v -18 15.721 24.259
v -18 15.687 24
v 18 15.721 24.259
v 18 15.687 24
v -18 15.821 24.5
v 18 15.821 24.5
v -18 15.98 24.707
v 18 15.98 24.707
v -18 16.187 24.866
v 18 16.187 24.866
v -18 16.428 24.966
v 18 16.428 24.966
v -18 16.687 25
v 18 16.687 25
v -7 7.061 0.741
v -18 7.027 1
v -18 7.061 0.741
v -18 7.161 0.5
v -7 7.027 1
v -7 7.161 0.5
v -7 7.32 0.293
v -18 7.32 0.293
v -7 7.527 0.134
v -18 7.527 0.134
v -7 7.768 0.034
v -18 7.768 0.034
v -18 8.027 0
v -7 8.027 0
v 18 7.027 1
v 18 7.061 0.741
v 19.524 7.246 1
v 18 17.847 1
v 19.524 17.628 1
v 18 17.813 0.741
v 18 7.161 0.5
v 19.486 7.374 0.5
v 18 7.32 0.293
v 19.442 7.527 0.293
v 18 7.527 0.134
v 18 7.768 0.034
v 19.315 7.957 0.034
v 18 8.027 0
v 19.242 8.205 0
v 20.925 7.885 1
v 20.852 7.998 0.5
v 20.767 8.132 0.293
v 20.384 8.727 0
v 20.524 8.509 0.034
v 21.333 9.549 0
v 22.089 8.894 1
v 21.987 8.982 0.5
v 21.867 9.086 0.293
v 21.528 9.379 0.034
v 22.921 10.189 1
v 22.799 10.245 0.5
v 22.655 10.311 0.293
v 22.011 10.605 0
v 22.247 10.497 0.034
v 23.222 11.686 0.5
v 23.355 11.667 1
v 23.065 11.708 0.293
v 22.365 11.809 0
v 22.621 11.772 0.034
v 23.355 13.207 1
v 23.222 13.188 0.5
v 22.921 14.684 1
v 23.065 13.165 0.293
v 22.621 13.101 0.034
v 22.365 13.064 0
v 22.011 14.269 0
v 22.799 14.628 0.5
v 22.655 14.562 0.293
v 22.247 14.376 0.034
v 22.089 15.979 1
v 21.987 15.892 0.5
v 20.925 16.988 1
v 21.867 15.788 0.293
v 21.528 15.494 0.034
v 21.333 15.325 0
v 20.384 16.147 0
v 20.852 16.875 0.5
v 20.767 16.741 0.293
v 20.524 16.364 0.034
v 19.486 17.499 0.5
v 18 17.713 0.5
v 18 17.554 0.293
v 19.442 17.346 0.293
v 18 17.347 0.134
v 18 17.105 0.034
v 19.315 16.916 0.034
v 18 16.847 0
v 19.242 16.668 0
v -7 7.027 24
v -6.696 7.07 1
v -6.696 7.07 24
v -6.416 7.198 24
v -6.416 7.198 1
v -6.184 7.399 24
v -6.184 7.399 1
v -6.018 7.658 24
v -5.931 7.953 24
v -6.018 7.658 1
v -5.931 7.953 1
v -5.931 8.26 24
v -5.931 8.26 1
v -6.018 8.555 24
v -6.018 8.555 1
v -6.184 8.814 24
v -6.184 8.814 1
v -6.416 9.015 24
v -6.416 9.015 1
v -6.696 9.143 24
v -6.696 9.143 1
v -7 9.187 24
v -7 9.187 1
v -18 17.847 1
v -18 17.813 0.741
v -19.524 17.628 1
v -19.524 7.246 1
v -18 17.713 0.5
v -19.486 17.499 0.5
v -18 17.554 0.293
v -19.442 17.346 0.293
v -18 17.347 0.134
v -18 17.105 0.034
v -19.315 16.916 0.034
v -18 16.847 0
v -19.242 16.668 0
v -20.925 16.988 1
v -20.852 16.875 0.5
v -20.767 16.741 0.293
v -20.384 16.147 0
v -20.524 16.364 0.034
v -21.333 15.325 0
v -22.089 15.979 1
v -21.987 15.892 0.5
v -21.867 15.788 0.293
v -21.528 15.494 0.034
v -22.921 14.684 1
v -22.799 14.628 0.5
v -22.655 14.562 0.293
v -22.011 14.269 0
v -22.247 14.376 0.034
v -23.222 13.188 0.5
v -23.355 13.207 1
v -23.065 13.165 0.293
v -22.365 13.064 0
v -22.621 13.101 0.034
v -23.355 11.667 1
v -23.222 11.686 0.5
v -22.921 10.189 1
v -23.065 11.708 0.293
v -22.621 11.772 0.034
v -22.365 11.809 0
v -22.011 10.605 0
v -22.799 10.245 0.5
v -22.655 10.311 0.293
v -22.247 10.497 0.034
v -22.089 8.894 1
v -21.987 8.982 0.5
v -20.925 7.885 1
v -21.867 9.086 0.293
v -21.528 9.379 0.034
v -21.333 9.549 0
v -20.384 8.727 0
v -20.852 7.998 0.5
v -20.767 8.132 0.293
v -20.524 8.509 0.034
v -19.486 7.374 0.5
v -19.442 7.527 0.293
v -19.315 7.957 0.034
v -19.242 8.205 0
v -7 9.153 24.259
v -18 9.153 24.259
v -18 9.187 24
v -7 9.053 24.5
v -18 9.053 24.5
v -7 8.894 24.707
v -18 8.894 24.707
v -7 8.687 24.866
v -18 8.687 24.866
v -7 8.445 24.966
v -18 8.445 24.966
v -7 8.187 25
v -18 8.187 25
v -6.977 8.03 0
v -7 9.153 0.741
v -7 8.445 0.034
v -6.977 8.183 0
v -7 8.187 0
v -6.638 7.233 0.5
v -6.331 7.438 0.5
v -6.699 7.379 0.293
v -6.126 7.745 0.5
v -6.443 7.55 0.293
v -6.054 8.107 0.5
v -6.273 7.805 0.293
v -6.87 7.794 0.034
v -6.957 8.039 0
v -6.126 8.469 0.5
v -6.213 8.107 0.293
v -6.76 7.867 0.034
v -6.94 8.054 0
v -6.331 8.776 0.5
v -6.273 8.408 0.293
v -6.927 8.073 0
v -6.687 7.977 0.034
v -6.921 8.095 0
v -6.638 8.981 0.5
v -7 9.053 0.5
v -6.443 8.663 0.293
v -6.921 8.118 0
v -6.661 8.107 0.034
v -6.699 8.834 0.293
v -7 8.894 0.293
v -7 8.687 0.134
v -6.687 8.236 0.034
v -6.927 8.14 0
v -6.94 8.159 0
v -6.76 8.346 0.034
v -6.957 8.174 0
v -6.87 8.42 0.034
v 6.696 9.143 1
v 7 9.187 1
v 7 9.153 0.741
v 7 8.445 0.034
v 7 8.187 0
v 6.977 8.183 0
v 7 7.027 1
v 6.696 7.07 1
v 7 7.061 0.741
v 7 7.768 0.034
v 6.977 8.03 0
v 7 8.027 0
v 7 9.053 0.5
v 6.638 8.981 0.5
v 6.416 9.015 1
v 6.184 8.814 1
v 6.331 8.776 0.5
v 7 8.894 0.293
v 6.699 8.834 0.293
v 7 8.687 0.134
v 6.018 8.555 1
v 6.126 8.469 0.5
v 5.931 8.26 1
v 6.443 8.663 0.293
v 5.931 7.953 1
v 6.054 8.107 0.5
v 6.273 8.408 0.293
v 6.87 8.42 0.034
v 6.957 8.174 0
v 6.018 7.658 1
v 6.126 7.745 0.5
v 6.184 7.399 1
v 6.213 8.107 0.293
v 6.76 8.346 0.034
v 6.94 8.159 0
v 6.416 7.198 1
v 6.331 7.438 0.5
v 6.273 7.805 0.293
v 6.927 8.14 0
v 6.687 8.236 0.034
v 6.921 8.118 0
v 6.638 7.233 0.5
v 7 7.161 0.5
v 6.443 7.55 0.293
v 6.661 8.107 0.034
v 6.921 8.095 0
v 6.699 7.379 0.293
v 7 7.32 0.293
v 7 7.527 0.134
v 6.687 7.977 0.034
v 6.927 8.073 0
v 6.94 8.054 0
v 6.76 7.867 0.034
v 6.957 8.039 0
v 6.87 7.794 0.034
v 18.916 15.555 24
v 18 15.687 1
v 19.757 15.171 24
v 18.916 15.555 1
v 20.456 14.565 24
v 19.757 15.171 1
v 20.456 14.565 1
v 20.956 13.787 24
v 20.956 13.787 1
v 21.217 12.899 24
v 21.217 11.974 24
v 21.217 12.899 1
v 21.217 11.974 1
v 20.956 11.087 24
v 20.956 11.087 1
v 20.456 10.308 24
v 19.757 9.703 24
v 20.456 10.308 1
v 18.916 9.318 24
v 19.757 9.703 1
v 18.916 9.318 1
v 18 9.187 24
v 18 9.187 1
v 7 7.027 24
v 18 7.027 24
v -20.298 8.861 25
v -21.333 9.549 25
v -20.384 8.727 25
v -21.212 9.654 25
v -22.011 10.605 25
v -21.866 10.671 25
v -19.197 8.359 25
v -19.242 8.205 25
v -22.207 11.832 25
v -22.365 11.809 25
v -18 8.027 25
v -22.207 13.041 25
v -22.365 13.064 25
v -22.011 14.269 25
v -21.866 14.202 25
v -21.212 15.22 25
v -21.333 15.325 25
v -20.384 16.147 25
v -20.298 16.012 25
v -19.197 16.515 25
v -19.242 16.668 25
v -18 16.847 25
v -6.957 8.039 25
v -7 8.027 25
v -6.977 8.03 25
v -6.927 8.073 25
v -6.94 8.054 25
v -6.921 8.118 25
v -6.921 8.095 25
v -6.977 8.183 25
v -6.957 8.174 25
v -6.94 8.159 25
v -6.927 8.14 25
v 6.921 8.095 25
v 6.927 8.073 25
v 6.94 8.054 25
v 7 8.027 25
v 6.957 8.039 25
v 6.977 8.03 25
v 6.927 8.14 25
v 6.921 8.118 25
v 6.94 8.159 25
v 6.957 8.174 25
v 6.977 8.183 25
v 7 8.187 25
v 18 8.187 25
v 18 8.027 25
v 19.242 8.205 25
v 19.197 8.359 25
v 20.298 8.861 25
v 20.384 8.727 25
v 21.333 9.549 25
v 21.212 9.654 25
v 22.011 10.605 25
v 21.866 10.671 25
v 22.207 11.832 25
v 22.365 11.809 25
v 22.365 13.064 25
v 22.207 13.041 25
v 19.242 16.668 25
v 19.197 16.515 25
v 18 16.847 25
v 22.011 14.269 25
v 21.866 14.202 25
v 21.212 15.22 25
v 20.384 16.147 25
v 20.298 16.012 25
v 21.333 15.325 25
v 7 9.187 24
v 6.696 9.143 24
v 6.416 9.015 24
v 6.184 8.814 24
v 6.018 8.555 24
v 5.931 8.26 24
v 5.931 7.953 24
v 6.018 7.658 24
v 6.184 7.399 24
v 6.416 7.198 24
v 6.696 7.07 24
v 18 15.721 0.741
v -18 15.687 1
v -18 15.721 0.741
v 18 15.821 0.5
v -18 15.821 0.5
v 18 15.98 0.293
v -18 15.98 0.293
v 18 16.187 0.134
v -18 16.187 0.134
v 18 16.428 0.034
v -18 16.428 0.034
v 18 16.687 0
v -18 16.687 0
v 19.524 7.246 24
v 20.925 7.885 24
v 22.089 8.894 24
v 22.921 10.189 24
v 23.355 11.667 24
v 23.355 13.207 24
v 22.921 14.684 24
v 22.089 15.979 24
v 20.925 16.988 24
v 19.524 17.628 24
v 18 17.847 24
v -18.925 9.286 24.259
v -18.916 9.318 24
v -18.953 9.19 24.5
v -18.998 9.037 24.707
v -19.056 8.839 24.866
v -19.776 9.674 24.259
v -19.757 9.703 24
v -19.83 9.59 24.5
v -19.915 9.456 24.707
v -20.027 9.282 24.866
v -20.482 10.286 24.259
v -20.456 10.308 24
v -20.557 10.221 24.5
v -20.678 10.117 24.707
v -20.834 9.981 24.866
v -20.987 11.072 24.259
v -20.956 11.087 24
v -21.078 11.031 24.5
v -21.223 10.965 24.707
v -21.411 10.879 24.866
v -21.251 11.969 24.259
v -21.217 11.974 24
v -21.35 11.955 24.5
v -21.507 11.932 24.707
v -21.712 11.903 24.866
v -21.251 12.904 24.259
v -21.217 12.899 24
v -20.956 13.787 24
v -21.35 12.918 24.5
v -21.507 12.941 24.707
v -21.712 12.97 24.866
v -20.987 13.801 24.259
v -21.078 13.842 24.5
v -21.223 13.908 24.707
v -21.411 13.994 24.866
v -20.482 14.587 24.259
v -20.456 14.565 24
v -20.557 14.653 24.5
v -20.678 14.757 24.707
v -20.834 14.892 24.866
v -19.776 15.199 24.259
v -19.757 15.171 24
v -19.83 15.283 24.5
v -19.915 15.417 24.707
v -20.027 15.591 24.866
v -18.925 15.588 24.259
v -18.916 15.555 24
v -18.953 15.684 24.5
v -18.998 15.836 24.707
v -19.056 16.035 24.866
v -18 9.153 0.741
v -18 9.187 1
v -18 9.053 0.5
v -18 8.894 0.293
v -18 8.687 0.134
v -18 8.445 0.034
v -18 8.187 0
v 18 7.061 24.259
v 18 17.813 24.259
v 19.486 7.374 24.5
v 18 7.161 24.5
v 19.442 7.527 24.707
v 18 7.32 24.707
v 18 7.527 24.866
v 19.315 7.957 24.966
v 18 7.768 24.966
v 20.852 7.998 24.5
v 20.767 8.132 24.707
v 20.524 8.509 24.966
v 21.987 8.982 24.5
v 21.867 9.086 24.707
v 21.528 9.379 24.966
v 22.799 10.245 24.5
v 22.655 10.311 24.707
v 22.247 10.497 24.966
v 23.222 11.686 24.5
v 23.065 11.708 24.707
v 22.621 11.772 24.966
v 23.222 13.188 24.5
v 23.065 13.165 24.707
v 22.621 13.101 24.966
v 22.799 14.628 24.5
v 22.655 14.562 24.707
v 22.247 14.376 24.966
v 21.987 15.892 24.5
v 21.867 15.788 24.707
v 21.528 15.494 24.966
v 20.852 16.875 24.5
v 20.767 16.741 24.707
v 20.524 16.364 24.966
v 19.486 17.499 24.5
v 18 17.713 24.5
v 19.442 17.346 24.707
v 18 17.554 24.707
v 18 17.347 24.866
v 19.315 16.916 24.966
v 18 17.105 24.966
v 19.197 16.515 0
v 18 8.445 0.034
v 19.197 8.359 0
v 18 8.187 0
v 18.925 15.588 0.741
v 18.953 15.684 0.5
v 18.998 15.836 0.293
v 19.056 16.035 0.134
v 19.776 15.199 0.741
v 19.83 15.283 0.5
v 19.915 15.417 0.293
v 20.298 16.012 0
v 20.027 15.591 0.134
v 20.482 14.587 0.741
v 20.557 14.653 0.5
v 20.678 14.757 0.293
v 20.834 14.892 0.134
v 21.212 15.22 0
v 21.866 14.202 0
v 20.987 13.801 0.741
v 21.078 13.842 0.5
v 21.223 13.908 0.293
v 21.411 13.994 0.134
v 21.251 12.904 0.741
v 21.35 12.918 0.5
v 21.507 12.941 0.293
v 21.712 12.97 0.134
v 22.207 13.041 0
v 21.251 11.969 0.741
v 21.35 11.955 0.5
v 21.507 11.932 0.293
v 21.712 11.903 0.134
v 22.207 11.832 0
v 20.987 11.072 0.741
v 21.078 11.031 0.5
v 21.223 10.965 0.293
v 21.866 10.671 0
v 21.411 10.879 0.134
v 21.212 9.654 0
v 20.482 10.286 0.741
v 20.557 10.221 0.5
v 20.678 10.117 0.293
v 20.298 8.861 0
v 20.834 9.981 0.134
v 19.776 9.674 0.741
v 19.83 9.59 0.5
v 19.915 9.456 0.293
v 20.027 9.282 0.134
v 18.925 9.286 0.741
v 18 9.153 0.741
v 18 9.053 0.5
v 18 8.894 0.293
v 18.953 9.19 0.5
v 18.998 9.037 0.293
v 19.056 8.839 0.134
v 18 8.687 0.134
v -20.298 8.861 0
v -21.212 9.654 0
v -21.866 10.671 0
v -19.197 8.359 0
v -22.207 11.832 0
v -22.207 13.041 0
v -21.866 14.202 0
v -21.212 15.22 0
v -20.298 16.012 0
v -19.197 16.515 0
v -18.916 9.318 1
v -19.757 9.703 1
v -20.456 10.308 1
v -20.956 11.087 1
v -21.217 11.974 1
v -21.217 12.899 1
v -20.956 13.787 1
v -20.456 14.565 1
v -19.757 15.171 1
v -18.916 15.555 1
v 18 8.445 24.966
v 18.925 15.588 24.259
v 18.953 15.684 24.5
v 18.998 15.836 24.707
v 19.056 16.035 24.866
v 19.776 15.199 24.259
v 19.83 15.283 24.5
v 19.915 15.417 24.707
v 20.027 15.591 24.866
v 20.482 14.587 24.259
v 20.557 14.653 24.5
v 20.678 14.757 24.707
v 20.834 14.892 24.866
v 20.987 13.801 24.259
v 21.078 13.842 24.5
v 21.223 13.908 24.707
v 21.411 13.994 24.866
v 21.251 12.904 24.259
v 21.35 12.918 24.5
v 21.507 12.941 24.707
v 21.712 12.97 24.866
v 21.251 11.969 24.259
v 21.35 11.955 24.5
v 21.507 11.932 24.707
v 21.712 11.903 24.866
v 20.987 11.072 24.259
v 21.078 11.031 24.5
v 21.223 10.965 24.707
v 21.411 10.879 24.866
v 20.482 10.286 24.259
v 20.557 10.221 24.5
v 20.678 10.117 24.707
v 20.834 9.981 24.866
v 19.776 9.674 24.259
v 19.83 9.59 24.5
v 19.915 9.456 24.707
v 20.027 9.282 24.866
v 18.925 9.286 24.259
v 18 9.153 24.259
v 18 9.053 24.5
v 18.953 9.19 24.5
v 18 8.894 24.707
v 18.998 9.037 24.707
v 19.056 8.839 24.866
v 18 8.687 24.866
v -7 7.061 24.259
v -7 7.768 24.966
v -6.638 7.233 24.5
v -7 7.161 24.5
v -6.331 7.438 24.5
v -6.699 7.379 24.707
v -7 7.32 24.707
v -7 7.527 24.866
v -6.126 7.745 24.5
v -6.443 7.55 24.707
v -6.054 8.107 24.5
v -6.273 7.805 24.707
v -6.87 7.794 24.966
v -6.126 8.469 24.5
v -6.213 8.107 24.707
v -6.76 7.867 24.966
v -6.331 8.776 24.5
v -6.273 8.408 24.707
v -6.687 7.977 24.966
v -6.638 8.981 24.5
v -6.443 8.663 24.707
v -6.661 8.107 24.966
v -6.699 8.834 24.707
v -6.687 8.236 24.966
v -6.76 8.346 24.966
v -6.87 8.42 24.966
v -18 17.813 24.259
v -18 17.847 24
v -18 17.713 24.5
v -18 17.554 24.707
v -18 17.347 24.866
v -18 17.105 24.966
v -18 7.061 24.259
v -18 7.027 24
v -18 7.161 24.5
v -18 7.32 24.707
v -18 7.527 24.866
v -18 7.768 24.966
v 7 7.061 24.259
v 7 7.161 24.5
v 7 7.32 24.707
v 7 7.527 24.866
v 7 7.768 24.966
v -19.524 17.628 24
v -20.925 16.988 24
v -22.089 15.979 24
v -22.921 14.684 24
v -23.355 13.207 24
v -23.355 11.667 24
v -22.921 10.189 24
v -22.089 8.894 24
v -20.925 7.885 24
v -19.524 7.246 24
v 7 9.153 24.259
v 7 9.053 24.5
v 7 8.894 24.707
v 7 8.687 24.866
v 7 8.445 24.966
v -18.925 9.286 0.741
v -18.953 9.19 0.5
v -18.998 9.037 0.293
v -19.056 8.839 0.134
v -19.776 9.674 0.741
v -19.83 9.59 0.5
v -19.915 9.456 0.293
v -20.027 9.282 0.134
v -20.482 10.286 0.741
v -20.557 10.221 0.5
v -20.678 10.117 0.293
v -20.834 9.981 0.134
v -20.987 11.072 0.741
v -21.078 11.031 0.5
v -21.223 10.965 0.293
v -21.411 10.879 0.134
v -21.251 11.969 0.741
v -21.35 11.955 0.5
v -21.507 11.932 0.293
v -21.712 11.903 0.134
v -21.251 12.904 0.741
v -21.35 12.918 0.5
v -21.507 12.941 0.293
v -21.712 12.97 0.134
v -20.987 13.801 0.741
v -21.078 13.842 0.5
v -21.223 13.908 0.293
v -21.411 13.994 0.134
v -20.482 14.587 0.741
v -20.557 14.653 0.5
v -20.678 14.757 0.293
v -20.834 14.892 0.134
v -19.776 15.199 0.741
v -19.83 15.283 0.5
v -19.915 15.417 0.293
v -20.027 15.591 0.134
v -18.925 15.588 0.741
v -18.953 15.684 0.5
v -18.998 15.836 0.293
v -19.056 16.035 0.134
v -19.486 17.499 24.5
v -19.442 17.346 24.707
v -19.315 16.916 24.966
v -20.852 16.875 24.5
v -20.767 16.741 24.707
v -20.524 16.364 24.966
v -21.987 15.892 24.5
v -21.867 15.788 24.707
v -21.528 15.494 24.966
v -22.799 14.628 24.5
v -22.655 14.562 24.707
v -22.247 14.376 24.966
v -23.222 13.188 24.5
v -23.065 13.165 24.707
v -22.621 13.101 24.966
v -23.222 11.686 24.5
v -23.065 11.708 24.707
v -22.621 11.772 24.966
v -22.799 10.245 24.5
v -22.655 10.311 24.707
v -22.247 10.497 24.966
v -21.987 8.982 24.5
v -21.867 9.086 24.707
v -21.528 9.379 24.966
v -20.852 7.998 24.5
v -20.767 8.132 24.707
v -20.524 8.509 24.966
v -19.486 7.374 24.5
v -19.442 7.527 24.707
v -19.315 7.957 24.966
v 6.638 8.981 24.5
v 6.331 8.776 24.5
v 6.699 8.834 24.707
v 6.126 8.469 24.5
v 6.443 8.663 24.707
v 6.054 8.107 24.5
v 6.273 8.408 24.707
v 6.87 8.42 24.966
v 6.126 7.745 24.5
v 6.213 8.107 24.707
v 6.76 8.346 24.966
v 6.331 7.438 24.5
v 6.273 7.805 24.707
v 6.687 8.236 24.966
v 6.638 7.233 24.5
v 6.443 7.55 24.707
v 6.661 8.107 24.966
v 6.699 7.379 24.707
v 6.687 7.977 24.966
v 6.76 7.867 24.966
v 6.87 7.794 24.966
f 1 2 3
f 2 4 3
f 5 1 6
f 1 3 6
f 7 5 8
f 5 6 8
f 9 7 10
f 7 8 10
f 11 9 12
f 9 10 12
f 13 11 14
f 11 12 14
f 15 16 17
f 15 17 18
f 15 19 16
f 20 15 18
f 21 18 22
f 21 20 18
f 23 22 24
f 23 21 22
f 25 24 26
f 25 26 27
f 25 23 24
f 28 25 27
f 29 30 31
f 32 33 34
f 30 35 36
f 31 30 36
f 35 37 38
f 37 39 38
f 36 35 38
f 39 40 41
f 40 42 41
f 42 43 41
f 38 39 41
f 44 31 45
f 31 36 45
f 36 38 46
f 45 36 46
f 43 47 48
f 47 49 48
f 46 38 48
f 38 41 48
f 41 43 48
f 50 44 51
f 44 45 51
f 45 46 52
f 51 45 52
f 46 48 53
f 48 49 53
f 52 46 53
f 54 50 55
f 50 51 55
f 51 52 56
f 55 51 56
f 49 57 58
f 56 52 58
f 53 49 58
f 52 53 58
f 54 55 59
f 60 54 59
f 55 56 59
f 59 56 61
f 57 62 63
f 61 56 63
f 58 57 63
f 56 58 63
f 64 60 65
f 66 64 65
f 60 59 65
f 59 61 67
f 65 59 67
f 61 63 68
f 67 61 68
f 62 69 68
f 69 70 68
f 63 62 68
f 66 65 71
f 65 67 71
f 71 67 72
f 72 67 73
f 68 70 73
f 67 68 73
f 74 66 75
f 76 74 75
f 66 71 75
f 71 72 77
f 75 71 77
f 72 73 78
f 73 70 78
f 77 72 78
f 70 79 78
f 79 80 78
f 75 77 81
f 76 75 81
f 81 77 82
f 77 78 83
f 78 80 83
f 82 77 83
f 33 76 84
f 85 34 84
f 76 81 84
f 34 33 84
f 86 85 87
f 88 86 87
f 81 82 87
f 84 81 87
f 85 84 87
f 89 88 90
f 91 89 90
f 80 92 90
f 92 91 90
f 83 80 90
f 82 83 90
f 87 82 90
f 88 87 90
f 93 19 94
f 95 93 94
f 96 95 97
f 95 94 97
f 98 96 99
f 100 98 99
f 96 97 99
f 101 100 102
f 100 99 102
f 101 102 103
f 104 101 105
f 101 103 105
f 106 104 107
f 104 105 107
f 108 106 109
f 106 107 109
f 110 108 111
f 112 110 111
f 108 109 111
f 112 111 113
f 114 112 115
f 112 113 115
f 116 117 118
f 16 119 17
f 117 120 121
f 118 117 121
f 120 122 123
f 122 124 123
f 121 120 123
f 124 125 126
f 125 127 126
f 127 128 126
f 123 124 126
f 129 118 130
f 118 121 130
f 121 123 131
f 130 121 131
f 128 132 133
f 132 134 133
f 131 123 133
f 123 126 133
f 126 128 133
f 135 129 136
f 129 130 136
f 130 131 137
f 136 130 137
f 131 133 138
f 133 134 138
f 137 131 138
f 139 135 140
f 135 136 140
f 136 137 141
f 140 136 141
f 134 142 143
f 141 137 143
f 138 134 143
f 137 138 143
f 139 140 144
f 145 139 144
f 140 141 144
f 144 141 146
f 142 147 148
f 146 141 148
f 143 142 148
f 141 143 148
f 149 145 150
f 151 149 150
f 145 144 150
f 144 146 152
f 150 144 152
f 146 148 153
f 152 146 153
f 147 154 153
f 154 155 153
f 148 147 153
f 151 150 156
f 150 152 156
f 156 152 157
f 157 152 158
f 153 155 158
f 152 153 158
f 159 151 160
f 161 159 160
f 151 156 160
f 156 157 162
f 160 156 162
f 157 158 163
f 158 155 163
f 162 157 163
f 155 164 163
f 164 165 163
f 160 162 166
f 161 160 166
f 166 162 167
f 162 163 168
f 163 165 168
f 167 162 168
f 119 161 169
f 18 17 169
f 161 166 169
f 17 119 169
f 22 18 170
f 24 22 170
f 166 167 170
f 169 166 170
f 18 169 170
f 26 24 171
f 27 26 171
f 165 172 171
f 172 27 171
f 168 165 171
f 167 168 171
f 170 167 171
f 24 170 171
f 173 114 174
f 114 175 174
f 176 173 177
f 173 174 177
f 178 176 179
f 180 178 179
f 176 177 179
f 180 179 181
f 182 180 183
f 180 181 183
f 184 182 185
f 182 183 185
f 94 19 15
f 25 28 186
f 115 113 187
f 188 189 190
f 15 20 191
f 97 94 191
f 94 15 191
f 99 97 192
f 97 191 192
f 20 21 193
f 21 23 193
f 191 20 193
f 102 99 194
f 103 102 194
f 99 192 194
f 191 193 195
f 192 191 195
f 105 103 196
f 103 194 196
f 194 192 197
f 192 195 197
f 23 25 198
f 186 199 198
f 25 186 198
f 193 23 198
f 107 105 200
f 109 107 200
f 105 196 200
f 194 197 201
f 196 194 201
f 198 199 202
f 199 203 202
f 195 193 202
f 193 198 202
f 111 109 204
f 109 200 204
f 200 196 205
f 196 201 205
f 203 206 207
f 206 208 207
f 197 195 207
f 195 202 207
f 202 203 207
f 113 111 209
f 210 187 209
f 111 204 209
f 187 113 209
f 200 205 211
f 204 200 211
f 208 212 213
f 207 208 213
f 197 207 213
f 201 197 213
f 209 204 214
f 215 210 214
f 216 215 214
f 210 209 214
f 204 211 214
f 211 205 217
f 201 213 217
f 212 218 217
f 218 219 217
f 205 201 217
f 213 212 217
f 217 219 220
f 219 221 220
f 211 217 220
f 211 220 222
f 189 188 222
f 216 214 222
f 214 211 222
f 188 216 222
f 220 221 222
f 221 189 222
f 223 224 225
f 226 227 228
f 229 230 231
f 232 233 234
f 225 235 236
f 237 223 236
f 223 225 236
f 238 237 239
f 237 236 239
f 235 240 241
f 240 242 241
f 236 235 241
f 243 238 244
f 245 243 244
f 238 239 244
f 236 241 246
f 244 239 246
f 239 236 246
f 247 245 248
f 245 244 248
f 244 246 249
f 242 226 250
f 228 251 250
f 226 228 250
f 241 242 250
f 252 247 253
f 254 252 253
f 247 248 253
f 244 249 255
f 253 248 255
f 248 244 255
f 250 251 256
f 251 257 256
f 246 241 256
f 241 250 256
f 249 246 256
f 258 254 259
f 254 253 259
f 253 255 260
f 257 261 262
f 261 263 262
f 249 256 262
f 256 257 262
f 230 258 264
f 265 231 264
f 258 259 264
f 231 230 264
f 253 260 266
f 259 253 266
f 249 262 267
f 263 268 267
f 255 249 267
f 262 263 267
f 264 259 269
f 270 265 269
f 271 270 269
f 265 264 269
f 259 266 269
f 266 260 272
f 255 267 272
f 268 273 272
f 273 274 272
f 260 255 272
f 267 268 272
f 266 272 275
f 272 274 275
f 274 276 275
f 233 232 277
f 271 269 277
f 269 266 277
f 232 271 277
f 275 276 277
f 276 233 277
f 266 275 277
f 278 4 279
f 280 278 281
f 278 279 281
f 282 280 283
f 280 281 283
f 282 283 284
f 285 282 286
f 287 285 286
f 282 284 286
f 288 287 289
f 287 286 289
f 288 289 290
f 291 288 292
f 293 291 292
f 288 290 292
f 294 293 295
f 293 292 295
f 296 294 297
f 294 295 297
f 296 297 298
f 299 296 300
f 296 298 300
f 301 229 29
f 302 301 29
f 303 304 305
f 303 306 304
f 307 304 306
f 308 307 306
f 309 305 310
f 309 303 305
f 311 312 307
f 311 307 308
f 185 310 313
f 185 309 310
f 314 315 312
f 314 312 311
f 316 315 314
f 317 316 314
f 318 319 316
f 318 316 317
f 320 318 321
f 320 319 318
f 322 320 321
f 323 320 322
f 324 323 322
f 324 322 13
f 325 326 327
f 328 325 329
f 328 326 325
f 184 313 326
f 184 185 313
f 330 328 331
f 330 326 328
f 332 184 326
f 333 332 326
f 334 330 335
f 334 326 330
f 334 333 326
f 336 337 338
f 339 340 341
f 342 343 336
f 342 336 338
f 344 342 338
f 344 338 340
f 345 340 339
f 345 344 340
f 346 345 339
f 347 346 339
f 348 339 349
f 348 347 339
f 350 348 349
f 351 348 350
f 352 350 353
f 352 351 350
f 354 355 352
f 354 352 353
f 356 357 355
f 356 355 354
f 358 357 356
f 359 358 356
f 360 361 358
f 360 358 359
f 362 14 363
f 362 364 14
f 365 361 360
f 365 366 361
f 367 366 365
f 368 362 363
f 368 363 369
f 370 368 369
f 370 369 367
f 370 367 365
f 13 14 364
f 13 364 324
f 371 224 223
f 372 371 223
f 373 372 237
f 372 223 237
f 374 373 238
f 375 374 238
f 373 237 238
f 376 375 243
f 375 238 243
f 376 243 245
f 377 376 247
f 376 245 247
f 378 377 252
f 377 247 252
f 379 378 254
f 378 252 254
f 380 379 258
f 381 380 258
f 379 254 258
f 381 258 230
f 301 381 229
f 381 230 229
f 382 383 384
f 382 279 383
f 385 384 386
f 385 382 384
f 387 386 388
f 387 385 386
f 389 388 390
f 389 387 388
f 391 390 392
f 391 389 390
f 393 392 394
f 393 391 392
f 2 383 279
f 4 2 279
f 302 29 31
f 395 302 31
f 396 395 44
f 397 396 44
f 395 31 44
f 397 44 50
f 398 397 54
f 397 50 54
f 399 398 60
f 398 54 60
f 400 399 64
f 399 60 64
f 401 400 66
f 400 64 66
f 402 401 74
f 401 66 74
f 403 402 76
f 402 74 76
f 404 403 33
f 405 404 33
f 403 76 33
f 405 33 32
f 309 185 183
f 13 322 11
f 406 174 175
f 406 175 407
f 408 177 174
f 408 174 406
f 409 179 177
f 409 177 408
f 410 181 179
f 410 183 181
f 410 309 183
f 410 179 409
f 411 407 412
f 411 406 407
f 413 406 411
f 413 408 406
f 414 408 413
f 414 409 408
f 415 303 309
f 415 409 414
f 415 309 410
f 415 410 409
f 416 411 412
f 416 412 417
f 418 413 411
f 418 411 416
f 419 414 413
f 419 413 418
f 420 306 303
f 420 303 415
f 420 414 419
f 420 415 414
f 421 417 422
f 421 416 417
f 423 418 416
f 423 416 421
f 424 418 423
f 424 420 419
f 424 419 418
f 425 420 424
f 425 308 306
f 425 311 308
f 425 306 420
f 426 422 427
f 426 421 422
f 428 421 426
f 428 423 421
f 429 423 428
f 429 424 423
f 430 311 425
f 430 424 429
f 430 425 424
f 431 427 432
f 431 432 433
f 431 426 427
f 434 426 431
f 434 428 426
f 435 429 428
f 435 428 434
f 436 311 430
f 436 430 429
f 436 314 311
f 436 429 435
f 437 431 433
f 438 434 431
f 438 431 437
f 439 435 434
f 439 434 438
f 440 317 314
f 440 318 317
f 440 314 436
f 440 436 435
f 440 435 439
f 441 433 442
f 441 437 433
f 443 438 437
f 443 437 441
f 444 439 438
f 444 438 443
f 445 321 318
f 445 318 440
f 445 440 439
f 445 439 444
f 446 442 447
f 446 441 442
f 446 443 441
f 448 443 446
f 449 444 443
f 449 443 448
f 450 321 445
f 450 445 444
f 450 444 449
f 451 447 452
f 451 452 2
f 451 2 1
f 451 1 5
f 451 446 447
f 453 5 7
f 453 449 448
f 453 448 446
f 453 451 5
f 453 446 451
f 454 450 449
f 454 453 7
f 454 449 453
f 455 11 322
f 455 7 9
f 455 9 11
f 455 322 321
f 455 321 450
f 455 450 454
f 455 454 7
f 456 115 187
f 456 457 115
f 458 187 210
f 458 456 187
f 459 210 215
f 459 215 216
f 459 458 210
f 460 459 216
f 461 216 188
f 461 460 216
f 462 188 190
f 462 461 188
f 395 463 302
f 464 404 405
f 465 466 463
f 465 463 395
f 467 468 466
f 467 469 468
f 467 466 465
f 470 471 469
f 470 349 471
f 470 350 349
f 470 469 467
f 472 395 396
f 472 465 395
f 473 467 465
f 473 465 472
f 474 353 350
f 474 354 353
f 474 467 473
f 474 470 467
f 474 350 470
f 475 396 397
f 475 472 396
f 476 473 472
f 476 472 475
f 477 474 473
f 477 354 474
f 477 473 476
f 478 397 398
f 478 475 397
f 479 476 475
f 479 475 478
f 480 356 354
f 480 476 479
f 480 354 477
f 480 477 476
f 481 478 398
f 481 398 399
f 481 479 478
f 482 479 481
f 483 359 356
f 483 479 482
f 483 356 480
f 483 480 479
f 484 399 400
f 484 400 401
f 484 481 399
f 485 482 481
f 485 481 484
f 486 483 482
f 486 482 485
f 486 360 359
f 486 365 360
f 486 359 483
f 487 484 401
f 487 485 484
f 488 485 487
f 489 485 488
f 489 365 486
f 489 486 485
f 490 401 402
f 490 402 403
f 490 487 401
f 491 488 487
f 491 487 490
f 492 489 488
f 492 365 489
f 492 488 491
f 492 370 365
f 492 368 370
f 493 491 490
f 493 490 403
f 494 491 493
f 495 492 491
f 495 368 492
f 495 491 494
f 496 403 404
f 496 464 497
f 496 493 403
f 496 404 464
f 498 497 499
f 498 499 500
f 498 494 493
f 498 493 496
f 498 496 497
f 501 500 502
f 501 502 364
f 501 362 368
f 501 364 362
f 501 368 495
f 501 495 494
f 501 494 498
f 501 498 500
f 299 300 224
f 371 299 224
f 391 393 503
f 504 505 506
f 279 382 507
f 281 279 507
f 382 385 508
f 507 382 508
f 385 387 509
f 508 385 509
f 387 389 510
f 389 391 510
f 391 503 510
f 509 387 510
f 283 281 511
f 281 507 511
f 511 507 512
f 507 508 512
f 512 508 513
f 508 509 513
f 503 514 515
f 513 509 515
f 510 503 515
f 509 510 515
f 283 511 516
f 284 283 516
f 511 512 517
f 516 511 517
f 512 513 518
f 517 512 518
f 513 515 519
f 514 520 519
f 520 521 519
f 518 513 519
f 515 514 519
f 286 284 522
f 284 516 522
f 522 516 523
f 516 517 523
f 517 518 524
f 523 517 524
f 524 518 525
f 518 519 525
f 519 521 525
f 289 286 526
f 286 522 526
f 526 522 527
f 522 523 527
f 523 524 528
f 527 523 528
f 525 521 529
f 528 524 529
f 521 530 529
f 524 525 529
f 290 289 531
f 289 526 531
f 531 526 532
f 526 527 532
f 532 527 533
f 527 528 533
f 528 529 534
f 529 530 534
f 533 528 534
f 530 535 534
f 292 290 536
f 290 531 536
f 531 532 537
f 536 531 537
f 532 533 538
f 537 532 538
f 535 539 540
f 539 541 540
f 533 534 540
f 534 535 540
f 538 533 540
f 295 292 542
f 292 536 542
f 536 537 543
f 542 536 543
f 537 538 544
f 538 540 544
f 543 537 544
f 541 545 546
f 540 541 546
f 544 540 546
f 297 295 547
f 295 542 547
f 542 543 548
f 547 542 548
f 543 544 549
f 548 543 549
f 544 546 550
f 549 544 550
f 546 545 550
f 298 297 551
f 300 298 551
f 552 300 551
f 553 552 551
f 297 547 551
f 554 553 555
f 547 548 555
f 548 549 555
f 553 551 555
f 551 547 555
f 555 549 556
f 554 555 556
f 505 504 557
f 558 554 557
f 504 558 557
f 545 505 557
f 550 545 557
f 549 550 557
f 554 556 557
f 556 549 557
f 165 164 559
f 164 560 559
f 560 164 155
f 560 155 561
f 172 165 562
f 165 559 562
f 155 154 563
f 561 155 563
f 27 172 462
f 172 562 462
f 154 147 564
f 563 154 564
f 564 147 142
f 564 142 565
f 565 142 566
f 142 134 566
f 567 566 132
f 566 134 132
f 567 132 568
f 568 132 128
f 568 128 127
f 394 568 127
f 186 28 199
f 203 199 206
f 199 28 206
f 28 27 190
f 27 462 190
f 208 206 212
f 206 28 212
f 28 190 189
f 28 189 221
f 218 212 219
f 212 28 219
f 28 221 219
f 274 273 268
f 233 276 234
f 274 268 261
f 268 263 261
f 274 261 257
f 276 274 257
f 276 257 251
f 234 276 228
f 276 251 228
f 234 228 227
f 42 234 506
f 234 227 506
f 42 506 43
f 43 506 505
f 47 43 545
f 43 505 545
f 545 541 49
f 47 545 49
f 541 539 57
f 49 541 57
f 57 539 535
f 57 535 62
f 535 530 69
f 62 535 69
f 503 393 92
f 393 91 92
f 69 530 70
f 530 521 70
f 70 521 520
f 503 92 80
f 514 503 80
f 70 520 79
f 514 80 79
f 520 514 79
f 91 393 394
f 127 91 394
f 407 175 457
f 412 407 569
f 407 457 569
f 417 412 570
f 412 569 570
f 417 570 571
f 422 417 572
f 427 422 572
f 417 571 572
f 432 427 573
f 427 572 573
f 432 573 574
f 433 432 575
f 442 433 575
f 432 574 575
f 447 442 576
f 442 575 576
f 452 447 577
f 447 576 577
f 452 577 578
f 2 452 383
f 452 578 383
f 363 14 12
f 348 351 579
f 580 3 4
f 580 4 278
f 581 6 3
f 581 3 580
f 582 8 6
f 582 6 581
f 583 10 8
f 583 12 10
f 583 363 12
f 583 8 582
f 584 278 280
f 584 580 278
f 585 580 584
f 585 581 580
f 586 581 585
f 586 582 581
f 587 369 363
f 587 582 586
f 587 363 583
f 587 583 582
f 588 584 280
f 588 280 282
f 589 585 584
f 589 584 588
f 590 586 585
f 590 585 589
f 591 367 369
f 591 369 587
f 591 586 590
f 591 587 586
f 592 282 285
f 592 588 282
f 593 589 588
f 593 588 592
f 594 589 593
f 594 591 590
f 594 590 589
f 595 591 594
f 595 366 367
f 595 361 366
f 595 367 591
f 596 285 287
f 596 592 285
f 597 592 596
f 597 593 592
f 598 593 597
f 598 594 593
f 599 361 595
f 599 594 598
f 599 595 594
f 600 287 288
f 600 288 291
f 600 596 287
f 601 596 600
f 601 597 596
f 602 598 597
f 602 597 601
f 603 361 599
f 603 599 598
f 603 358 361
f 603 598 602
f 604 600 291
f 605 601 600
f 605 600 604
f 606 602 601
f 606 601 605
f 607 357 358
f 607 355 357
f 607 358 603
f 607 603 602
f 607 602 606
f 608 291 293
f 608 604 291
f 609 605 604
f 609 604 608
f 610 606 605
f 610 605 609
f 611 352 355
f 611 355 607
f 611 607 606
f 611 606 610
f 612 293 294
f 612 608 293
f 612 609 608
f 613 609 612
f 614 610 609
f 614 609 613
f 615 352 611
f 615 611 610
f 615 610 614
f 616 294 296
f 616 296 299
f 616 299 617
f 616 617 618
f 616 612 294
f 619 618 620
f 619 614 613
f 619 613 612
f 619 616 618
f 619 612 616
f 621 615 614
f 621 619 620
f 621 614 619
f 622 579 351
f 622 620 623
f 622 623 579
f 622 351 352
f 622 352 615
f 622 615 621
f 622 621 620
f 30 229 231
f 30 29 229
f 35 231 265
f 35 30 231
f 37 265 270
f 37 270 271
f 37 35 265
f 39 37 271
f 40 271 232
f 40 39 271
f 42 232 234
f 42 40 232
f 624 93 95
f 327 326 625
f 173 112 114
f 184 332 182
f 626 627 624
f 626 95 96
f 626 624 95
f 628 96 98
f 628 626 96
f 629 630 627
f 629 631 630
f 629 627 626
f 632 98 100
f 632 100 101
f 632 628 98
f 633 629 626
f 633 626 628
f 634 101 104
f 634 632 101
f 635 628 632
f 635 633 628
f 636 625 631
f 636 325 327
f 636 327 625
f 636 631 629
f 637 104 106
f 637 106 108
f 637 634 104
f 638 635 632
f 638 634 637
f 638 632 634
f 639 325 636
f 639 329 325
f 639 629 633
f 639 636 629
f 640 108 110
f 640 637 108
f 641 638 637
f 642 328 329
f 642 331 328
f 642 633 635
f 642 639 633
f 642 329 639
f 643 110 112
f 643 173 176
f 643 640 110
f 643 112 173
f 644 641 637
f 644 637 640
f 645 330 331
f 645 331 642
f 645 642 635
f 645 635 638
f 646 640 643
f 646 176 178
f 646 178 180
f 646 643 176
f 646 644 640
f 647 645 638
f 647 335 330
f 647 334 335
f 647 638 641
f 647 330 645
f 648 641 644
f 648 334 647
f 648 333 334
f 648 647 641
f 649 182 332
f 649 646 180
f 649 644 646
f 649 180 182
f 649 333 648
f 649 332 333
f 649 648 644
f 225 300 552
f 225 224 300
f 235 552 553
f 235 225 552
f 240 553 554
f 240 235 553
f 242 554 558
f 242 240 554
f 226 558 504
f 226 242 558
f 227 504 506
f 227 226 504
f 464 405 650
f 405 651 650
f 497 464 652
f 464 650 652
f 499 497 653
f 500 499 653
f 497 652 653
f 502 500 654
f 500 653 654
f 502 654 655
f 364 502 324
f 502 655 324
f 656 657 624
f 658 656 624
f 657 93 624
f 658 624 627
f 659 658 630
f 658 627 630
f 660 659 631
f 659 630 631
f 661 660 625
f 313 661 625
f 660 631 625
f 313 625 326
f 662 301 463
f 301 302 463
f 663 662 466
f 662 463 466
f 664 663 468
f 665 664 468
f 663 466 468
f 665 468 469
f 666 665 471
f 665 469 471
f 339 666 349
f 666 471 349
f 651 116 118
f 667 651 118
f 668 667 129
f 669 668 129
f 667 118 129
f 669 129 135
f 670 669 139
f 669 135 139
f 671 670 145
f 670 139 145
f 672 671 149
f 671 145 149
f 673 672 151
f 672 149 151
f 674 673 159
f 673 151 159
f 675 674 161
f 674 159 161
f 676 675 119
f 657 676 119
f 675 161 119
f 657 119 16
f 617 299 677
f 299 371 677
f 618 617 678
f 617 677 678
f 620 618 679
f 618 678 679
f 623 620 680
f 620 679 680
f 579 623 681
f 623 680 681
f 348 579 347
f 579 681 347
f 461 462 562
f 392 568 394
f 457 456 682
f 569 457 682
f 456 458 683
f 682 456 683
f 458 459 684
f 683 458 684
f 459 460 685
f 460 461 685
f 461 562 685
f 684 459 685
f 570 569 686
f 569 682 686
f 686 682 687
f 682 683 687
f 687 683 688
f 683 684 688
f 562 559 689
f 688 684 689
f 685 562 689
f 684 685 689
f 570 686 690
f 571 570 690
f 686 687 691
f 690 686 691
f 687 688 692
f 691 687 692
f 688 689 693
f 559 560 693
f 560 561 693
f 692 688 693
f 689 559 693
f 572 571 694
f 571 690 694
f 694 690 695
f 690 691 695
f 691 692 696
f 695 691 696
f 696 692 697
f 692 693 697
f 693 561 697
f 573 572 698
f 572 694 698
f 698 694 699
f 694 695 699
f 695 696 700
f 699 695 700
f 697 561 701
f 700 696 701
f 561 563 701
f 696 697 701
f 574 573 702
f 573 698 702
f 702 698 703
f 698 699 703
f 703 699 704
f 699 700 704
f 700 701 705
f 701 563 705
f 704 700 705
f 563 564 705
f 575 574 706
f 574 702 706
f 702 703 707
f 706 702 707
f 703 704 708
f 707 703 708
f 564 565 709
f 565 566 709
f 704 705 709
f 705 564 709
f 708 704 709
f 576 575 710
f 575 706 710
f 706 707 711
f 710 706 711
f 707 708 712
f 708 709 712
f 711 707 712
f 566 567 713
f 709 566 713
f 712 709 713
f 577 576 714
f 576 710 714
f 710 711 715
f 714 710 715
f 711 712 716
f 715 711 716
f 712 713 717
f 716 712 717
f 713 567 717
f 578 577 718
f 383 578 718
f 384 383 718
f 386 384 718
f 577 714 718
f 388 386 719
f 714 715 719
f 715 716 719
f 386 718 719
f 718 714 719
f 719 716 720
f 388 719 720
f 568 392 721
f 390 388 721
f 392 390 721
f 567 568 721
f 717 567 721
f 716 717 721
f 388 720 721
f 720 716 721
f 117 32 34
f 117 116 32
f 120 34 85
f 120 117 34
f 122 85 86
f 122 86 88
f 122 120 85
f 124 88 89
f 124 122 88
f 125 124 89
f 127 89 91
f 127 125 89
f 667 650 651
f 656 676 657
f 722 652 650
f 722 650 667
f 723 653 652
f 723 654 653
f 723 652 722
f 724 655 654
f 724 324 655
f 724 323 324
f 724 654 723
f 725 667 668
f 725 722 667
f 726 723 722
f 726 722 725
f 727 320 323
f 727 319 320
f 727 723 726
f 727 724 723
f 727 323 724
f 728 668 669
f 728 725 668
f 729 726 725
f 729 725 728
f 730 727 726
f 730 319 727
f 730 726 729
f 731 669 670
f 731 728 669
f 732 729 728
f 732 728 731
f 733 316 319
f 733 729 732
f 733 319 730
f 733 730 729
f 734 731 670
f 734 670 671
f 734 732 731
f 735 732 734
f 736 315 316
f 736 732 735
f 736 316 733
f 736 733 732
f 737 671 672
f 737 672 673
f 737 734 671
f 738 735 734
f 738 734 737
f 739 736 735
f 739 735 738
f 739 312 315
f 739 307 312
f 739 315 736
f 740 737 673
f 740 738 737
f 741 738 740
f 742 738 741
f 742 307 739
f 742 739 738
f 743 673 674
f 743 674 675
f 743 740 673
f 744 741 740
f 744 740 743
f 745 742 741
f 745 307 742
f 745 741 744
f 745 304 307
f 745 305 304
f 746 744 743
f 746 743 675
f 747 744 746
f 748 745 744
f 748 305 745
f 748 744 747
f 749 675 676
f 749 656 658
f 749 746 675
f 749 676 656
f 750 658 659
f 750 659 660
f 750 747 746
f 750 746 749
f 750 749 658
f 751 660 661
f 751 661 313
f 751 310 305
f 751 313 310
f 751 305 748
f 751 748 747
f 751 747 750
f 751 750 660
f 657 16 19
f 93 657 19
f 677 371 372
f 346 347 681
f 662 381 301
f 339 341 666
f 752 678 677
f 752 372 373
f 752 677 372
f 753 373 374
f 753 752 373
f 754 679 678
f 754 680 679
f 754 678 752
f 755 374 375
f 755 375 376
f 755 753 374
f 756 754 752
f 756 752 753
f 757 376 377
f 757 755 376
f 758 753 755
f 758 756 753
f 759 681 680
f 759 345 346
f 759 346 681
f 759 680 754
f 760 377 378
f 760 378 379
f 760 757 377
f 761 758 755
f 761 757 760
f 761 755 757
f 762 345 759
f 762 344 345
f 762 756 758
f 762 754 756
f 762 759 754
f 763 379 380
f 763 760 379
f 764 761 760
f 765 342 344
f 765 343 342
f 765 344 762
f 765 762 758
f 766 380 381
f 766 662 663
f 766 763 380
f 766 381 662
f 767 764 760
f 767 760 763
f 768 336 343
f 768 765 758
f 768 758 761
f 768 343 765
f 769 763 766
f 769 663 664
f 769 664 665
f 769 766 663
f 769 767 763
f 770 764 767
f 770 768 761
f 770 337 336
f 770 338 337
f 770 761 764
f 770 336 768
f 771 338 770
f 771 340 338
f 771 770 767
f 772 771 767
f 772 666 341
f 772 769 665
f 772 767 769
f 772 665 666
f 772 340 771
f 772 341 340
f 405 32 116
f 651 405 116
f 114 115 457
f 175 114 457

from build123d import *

# Parameters (mm, degrees)
F1_DEPTH = 25
F2_R     = 1


with BuildPart() as f1:
    # F0 (on Top) → F1 (new body)
    with BuildSketch(Plane.XY):
        with BuildLine():
            ThreePointArc((-18, 9.186661), (-21.25, 12.436661), (-18, 15.686661))
            Line((-18, 15.686661), (18, 15.686661))
            ThreePointArc((18, 15.686661), (21.25, 12.436661), (18, 9.186661))
            Line((18, 9.186661), (7, 9.186661))
            ThreePointArc((7, 9.186661), (5.92, 8.106661), (7, 7.026661))
            Line((7, 7.026661), (18, 7.026661))
            ThreePointArc((18, 7.026661), (23.41, 12.436661), (18, 17.846661))
            Line((18, 17.846661), (-18, 17.846661))
            ThreePointArc((-18, 17.846661), (-23.41, 12.436661), (-18, 7.026661))
            Line((-18, 7.026661), (-7, 7.026661))
            ThreePointArc((-7, 7.026661), (-5.92, 8.106661), (-7, 9.186661))
            Line((-7, 9.186661), (-18, 9.186661))
        make_face()
    extrude(amount=F1_DEPTH)

    # F2
    f2_edges = [f1.edges().sort_by_distance(p)[0] for p in [
        (0, 17.846661, 25),
        (0, 15.686661, 25),
        (21.25, 12.436661, 25),
        (23.41, 12.436661, 25),
        (12.5, 9.186661, 25),
        (12.5, 7.026661, 25),
        (5.92, 8.106661, 25),
        (-5.92, 8.106661, 25),
        (-21.25, 12.436661, 25),
        (-12.5, 9.186661, 25),
        (-12.5, 7.026661, 25),
        (-23.41, 12.436661, 25),
        (12.5, 7.026661, 0),
        (23.41, 12.436661, 0),
        (0, 17.846661, 0),
        (0, 15.686661, 0),
        (21.25, 12.436661, 0),
        (-12.5, 9.186661, 0),
        (-5.92, 8.106661, 0),
        (5.92, 8.106661, 0),
        (12.5, 9.186661, 0),
        (-23.41, 12.436661, 0),
        (-21.25, 12.436661, 0),
    ]]
    fillet(f2_edges, radius=F2_R)


solid = f1.part
